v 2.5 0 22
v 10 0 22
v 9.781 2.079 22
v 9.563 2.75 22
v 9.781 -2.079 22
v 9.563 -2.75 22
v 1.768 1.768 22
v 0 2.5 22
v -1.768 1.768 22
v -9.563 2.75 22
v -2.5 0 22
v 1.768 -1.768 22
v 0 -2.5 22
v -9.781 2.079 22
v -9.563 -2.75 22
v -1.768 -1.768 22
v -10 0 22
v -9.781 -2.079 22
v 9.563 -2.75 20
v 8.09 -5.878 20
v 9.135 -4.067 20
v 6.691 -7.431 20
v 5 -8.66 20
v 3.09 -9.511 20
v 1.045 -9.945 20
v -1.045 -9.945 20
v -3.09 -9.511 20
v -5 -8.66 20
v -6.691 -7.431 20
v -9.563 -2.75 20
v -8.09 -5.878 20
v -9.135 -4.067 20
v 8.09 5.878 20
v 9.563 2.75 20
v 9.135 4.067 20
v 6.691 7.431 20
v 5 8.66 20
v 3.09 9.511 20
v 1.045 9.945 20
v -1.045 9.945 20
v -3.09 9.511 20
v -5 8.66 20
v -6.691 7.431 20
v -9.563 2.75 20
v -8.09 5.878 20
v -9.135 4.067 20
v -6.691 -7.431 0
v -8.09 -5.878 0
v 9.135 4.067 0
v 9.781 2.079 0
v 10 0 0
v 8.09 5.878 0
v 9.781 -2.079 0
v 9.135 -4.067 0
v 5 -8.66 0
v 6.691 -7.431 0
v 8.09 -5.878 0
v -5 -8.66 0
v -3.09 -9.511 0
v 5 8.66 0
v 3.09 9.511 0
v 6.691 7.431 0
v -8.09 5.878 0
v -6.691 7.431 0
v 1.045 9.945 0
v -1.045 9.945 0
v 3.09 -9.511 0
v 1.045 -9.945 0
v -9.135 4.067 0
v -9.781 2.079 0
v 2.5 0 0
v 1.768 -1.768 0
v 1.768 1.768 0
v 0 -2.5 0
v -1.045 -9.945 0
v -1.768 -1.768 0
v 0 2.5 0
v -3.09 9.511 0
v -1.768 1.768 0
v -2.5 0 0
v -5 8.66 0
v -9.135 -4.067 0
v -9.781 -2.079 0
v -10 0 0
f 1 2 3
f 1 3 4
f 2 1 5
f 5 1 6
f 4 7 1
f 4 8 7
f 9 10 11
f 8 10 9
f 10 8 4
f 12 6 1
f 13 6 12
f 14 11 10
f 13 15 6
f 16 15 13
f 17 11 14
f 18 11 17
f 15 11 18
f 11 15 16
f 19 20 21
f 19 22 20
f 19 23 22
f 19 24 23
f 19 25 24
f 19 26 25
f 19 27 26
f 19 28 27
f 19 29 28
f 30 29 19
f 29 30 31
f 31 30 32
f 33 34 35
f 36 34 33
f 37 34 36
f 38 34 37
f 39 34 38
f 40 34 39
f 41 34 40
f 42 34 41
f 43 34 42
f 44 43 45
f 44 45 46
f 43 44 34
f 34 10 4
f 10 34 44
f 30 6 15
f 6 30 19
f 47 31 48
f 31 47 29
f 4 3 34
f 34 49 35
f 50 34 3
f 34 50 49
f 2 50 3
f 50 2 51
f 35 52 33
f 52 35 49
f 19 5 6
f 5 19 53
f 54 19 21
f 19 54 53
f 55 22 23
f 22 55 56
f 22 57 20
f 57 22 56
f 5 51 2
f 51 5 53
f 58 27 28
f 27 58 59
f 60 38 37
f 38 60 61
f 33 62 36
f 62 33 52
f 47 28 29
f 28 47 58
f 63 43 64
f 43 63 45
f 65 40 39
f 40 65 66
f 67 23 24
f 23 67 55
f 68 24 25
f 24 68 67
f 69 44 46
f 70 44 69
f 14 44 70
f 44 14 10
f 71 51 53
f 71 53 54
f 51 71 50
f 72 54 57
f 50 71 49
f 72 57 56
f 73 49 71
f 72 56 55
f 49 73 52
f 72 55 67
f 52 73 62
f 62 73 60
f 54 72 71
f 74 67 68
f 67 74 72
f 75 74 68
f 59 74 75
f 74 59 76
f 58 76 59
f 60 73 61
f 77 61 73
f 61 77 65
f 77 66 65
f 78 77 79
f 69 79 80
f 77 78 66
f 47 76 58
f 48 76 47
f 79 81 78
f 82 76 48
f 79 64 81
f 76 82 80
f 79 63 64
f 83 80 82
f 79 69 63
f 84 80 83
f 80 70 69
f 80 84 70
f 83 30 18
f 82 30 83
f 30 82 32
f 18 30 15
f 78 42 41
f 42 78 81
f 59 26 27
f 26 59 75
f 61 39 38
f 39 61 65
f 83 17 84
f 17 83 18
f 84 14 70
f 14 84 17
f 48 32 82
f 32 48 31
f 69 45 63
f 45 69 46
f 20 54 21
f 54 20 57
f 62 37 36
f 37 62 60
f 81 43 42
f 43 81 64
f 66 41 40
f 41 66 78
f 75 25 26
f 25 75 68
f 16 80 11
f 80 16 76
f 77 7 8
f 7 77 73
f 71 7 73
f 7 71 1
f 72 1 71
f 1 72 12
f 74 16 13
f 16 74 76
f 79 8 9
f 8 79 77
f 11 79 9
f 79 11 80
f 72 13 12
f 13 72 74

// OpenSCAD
module standoff (height=20, diameter=20, hole_diameter=5, slot_width=5.5, slot_depth=2)
{
	difference ()
	{
		intersection()
		{
			cylinder (h=height+slot_depth, r=diameter/2);
			union()
			{
				translate ([-(diameter+2)/2, -(slot_width/2), height]) cube([diameter+2, slot_width, slot_depth]);
				cylinder (h=height, r=diameter/2);
			}
		}
		translate([0,0,-0.5]) cylinder (h=height+3, r=hole_diameter/2);
	}
}

standoff(height=20);
